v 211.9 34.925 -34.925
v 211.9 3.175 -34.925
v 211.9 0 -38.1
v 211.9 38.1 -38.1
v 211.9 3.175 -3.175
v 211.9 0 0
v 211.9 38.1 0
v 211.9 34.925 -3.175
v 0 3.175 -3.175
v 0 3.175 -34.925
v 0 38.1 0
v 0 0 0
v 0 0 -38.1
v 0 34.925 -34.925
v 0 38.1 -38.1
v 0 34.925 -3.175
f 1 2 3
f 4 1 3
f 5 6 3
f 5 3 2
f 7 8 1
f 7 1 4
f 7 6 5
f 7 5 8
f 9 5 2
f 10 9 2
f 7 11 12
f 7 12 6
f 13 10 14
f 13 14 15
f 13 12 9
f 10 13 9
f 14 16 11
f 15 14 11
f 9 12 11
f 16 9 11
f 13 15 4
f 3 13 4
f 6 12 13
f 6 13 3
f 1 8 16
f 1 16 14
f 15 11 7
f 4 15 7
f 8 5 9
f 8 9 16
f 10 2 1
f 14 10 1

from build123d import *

# Parameters (mm, degrees)
SKETCH1_W               = 211.9
SKETCH1_H               = 38.1
BOSS_EXTRUDE1_DEPTH     = 38.1
SKETCH2_W               = 31.75
SKETCH2_H               = 31.75
CUT_EXTRUDE1_DEPTH      = 1
CUT_EXTRUDE1_DEPTH_BACK = 212.9


with BuildPart() as part:
    # Sketch1 → Boss-Extrude1 (new body)
    with BuildSketch(Plane.XY):
        with Locations((105.95, 19.05)):
            Rectangle(SKETCH1_W, SKETCH1_H)
    extrude(amount=-BOSS_EXTRUDE1_DEPTH)

    # Sketch2 → Cut-Extrude1 (cut, two sides)
    with BuildSketch(Plane(origin=(211.9, 0, 0), x_dir=(0, 0, -1), z_dir=(1, 0, 0))) as cut_extrude1_sk:
        with Locations((19.05, 19.05)):
            Rectangle(SKETCH2_W, SKETCH2_H)
    extrude(amount=CUT_EXTRUDE1_DEPTH, mode=Mode.SUBTRACT)
    extrude(cut_extrude1_sk.sketch, amount=-CUT_EXTRUDE1_DEPTH_BACK, mode=Mode.SUBTRACT)


solid = part.part
